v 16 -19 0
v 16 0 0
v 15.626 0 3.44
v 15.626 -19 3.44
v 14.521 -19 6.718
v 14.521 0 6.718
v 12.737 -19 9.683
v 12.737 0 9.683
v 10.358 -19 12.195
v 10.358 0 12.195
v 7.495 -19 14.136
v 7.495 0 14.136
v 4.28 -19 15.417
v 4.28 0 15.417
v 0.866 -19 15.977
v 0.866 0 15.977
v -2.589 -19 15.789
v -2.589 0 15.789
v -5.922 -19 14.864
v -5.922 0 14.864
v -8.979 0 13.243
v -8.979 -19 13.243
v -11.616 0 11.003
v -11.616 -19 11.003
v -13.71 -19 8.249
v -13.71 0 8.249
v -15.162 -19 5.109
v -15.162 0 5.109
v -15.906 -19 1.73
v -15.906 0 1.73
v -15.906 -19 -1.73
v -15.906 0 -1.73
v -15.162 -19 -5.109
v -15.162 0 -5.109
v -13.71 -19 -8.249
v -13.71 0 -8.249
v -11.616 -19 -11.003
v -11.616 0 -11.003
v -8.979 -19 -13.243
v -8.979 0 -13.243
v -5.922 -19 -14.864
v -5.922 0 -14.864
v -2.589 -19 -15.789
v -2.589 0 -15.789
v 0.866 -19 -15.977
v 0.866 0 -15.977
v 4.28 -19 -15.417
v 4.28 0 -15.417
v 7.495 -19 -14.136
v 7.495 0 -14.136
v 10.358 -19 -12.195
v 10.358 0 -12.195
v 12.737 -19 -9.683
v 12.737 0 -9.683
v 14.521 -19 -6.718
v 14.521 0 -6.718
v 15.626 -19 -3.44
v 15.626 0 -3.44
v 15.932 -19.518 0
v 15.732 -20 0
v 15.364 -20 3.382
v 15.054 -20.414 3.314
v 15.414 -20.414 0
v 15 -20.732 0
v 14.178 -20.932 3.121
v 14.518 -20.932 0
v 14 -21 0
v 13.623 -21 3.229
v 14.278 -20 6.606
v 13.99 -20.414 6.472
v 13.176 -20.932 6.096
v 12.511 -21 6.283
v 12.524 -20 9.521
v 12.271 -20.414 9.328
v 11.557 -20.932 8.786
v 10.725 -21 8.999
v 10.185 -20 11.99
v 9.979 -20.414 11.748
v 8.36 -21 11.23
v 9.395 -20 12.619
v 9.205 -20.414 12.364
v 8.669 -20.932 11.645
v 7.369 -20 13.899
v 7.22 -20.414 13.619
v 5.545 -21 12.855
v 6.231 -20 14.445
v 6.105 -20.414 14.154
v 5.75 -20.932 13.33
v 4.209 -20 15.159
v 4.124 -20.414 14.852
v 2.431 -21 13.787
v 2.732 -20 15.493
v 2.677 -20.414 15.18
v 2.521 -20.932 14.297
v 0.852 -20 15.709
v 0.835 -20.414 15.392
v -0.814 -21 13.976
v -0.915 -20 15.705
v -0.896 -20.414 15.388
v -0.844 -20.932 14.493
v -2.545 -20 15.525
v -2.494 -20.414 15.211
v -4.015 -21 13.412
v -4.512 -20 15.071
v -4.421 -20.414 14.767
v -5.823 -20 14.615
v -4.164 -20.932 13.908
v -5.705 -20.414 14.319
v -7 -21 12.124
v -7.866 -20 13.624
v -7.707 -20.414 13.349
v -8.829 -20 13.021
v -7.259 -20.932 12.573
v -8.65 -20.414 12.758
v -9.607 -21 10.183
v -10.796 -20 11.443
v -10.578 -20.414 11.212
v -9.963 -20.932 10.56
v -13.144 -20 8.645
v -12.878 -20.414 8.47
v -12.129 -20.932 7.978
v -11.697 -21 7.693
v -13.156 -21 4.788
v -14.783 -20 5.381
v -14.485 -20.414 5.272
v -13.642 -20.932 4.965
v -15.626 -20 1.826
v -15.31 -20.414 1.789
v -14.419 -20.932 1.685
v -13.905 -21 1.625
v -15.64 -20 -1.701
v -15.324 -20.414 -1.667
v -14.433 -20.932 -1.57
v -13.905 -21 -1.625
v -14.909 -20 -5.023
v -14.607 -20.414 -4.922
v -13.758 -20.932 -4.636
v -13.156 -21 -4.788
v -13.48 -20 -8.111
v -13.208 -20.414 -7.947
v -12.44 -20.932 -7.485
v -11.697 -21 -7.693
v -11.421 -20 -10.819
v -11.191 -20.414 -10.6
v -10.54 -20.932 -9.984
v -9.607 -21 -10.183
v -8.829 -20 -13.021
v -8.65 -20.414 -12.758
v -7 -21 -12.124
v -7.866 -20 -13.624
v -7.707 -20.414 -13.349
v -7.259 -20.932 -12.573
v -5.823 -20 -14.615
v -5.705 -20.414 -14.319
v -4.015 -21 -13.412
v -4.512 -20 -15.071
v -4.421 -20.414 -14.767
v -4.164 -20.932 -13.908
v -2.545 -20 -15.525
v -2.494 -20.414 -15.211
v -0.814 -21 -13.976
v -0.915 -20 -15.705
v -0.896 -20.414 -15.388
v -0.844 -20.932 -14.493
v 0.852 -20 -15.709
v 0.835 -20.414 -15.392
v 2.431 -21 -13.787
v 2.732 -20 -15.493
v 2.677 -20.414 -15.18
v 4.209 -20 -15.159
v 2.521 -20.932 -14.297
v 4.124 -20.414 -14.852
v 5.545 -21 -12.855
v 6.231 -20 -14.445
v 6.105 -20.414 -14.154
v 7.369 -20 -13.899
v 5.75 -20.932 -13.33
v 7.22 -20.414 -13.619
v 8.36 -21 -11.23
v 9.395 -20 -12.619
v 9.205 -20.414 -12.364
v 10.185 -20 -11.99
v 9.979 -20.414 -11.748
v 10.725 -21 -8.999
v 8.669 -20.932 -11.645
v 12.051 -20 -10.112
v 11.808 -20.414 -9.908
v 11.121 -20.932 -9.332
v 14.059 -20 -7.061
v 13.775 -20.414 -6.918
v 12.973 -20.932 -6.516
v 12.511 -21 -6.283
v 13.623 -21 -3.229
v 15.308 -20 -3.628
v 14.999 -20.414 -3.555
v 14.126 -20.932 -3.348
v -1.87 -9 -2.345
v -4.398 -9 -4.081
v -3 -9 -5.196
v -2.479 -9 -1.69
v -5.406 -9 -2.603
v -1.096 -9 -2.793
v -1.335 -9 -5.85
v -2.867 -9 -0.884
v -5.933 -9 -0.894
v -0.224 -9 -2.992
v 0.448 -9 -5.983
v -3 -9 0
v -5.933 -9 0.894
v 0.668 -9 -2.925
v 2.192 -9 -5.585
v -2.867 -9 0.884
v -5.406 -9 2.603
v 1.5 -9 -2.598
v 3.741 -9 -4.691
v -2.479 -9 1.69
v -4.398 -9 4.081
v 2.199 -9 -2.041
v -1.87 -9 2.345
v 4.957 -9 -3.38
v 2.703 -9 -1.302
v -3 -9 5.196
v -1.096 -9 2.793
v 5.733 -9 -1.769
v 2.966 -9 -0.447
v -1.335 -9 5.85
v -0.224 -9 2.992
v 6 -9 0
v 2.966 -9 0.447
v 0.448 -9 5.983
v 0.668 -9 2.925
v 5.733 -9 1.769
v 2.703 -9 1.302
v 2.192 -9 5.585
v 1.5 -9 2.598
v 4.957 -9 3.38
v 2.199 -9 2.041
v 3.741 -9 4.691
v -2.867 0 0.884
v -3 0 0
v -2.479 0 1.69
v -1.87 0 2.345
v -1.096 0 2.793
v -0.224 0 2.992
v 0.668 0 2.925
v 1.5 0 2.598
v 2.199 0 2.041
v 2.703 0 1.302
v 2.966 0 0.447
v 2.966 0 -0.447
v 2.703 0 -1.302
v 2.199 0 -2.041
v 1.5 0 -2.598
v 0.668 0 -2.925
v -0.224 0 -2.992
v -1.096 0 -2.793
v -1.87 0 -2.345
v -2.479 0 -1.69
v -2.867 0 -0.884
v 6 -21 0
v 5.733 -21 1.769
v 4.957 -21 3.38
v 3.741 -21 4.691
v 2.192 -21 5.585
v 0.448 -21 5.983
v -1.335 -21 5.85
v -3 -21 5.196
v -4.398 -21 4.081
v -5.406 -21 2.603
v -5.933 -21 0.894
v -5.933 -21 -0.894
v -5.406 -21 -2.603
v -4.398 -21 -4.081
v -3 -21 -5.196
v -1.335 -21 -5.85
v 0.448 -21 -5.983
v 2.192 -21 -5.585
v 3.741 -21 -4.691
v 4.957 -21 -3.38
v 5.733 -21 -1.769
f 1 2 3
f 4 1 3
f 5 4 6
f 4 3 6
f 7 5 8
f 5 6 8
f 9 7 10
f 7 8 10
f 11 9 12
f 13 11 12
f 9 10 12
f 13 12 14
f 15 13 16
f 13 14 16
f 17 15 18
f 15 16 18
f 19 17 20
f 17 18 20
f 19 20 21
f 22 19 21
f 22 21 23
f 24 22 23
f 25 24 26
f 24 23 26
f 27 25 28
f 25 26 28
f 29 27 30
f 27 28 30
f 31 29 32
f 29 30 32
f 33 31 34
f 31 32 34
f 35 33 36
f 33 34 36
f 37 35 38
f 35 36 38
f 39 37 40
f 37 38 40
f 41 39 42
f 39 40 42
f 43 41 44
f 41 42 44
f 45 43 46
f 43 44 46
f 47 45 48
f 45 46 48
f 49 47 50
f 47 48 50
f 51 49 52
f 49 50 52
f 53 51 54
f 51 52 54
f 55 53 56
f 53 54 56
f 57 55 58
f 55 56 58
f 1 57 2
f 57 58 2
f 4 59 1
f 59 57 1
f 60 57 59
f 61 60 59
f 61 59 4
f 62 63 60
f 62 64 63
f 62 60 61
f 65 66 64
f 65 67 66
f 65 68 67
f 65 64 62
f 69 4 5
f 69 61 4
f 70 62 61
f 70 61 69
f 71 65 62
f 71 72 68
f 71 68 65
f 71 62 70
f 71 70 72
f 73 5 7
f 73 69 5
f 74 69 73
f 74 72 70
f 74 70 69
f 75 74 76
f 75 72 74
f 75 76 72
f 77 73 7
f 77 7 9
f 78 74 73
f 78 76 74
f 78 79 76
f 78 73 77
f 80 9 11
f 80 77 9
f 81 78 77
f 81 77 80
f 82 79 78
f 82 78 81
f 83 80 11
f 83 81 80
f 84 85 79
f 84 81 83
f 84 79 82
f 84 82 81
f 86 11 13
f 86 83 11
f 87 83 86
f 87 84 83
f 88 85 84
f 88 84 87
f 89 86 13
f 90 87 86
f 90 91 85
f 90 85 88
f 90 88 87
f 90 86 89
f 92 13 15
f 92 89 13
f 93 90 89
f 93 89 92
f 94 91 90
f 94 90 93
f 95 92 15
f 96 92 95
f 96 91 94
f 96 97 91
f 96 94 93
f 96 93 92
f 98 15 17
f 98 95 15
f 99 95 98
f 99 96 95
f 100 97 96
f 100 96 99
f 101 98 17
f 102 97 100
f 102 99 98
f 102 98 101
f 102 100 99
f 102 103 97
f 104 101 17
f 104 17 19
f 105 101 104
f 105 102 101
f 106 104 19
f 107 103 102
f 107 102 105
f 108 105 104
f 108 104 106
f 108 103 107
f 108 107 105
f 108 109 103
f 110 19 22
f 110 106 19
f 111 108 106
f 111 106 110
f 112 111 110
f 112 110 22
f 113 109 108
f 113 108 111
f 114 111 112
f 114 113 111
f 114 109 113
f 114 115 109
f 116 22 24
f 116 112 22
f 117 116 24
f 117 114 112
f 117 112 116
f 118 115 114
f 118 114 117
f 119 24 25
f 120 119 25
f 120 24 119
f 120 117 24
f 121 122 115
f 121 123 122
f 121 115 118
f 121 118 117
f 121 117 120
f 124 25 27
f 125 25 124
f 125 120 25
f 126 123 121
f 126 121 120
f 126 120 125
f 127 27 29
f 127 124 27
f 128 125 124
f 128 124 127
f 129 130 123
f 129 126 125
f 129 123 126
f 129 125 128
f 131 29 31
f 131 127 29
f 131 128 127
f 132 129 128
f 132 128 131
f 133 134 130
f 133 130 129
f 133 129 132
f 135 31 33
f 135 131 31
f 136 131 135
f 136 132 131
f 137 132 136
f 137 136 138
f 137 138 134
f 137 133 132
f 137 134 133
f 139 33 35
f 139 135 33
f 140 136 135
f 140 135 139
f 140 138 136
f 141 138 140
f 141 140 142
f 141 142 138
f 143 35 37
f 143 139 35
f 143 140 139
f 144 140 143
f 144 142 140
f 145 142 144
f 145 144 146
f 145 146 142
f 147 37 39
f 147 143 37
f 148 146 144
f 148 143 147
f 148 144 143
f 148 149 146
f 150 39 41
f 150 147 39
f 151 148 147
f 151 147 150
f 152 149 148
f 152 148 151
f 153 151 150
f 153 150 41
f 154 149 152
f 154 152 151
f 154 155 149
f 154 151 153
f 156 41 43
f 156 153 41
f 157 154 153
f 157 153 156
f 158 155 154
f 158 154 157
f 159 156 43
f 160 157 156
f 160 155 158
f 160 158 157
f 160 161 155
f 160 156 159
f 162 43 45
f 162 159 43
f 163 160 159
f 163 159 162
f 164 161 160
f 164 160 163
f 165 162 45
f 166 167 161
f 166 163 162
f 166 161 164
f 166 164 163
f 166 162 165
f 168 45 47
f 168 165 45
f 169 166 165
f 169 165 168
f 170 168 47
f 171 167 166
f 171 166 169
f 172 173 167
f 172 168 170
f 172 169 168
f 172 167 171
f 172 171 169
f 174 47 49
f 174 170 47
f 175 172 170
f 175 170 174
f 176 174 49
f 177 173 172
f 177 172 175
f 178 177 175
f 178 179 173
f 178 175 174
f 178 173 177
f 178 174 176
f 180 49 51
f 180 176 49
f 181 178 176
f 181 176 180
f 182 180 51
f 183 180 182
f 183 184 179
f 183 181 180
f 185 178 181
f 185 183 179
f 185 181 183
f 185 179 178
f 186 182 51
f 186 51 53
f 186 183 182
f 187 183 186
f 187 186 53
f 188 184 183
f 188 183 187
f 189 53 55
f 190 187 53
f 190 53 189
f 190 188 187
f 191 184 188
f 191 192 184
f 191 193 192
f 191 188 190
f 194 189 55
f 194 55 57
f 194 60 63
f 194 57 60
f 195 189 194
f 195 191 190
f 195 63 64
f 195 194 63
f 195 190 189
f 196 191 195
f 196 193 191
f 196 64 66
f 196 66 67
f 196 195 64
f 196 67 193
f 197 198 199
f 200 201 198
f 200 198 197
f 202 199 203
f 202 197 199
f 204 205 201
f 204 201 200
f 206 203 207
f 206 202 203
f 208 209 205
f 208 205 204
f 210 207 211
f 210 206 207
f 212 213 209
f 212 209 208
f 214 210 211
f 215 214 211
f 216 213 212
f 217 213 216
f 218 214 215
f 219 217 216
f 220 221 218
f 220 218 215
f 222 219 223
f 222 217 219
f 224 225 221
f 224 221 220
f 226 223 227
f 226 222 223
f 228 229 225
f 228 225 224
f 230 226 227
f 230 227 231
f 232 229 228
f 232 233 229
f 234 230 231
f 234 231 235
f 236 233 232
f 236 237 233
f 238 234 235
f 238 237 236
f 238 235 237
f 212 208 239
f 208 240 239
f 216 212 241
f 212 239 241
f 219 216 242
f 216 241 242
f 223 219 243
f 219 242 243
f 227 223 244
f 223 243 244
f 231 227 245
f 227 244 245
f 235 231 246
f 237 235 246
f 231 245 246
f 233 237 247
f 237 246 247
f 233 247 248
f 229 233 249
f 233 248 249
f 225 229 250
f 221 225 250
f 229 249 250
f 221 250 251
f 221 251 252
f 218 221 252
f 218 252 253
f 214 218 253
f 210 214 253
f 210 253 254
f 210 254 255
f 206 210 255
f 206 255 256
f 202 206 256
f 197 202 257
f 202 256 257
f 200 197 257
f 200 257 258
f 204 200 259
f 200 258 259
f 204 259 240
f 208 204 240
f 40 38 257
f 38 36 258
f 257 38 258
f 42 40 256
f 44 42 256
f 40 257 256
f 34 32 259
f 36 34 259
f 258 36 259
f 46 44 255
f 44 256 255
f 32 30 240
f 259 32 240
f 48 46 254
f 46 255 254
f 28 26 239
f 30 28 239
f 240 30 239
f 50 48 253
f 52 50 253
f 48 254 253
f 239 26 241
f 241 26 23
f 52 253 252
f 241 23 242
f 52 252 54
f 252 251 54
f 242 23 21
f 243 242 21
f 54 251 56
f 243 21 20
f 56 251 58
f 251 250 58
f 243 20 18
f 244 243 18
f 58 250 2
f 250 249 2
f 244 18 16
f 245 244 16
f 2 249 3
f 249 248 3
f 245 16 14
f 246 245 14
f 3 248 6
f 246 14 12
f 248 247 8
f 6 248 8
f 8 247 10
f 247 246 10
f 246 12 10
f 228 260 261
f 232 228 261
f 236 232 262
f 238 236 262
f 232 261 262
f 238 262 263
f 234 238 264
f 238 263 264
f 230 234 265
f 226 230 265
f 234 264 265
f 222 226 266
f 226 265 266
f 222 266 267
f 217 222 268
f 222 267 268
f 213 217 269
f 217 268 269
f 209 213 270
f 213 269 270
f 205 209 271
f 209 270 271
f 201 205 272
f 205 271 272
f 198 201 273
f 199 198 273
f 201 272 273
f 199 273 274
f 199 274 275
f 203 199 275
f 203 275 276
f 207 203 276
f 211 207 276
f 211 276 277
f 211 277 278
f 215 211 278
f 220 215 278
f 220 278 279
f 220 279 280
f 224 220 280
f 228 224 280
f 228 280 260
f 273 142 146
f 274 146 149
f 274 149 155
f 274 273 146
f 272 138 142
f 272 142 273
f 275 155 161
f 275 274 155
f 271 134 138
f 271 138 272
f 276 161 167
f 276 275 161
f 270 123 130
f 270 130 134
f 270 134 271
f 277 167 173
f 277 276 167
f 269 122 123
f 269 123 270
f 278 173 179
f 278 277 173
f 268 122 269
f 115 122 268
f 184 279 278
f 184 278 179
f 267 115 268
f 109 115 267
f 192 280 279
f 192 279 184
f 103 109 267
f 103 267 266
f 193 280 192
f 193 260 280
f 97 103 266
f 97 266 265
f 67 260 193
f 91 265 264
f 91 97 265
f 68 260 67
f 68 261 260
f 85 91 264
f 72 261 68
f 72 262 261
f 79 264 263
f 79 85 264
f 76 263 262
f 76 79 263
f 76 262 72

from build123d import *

# Parameters (mm, degrees)
F0_R           = 16
F1_DEPTH       = 21
F3_D           = 6
F3_DEPTH       = 21
F3_CBORE_D     = 12
F3_CBORE_DEPTH = 12
F3_TIP         = 1.8025818571
F4_R           = 2


with BuildPart() as f1:
    # F0 (on Front) → F1 (new body)
    with BuildSketch(Plane.XZ):
        Circle(F0_R)
    extrude(amount=F1_DEPTH)

    # F3
    with Locations(Plane.XZ.offset(21)):
        with Locations((0, 0)):
            CounterBoreHole(F3_D / 2, F3_CBORE_D / 2, F3_CBORE_DEPTH, depth=F3_DEPTH)
            with Locations((0, 0, -(F3_DEPTH + F3_TIP / 2))):  # 118° drill point
                Cone(0, F3_D / 2, F3_TIP, mode=Mode.SUBTRACT)

    # F4
    f4_edges = [f1.edges().sort_by_distance(p)[0] for p in [
        (-16, -21, 0),
    ]]
    fillet(f4_edges, radius=F4_R)


solid = f1.part
